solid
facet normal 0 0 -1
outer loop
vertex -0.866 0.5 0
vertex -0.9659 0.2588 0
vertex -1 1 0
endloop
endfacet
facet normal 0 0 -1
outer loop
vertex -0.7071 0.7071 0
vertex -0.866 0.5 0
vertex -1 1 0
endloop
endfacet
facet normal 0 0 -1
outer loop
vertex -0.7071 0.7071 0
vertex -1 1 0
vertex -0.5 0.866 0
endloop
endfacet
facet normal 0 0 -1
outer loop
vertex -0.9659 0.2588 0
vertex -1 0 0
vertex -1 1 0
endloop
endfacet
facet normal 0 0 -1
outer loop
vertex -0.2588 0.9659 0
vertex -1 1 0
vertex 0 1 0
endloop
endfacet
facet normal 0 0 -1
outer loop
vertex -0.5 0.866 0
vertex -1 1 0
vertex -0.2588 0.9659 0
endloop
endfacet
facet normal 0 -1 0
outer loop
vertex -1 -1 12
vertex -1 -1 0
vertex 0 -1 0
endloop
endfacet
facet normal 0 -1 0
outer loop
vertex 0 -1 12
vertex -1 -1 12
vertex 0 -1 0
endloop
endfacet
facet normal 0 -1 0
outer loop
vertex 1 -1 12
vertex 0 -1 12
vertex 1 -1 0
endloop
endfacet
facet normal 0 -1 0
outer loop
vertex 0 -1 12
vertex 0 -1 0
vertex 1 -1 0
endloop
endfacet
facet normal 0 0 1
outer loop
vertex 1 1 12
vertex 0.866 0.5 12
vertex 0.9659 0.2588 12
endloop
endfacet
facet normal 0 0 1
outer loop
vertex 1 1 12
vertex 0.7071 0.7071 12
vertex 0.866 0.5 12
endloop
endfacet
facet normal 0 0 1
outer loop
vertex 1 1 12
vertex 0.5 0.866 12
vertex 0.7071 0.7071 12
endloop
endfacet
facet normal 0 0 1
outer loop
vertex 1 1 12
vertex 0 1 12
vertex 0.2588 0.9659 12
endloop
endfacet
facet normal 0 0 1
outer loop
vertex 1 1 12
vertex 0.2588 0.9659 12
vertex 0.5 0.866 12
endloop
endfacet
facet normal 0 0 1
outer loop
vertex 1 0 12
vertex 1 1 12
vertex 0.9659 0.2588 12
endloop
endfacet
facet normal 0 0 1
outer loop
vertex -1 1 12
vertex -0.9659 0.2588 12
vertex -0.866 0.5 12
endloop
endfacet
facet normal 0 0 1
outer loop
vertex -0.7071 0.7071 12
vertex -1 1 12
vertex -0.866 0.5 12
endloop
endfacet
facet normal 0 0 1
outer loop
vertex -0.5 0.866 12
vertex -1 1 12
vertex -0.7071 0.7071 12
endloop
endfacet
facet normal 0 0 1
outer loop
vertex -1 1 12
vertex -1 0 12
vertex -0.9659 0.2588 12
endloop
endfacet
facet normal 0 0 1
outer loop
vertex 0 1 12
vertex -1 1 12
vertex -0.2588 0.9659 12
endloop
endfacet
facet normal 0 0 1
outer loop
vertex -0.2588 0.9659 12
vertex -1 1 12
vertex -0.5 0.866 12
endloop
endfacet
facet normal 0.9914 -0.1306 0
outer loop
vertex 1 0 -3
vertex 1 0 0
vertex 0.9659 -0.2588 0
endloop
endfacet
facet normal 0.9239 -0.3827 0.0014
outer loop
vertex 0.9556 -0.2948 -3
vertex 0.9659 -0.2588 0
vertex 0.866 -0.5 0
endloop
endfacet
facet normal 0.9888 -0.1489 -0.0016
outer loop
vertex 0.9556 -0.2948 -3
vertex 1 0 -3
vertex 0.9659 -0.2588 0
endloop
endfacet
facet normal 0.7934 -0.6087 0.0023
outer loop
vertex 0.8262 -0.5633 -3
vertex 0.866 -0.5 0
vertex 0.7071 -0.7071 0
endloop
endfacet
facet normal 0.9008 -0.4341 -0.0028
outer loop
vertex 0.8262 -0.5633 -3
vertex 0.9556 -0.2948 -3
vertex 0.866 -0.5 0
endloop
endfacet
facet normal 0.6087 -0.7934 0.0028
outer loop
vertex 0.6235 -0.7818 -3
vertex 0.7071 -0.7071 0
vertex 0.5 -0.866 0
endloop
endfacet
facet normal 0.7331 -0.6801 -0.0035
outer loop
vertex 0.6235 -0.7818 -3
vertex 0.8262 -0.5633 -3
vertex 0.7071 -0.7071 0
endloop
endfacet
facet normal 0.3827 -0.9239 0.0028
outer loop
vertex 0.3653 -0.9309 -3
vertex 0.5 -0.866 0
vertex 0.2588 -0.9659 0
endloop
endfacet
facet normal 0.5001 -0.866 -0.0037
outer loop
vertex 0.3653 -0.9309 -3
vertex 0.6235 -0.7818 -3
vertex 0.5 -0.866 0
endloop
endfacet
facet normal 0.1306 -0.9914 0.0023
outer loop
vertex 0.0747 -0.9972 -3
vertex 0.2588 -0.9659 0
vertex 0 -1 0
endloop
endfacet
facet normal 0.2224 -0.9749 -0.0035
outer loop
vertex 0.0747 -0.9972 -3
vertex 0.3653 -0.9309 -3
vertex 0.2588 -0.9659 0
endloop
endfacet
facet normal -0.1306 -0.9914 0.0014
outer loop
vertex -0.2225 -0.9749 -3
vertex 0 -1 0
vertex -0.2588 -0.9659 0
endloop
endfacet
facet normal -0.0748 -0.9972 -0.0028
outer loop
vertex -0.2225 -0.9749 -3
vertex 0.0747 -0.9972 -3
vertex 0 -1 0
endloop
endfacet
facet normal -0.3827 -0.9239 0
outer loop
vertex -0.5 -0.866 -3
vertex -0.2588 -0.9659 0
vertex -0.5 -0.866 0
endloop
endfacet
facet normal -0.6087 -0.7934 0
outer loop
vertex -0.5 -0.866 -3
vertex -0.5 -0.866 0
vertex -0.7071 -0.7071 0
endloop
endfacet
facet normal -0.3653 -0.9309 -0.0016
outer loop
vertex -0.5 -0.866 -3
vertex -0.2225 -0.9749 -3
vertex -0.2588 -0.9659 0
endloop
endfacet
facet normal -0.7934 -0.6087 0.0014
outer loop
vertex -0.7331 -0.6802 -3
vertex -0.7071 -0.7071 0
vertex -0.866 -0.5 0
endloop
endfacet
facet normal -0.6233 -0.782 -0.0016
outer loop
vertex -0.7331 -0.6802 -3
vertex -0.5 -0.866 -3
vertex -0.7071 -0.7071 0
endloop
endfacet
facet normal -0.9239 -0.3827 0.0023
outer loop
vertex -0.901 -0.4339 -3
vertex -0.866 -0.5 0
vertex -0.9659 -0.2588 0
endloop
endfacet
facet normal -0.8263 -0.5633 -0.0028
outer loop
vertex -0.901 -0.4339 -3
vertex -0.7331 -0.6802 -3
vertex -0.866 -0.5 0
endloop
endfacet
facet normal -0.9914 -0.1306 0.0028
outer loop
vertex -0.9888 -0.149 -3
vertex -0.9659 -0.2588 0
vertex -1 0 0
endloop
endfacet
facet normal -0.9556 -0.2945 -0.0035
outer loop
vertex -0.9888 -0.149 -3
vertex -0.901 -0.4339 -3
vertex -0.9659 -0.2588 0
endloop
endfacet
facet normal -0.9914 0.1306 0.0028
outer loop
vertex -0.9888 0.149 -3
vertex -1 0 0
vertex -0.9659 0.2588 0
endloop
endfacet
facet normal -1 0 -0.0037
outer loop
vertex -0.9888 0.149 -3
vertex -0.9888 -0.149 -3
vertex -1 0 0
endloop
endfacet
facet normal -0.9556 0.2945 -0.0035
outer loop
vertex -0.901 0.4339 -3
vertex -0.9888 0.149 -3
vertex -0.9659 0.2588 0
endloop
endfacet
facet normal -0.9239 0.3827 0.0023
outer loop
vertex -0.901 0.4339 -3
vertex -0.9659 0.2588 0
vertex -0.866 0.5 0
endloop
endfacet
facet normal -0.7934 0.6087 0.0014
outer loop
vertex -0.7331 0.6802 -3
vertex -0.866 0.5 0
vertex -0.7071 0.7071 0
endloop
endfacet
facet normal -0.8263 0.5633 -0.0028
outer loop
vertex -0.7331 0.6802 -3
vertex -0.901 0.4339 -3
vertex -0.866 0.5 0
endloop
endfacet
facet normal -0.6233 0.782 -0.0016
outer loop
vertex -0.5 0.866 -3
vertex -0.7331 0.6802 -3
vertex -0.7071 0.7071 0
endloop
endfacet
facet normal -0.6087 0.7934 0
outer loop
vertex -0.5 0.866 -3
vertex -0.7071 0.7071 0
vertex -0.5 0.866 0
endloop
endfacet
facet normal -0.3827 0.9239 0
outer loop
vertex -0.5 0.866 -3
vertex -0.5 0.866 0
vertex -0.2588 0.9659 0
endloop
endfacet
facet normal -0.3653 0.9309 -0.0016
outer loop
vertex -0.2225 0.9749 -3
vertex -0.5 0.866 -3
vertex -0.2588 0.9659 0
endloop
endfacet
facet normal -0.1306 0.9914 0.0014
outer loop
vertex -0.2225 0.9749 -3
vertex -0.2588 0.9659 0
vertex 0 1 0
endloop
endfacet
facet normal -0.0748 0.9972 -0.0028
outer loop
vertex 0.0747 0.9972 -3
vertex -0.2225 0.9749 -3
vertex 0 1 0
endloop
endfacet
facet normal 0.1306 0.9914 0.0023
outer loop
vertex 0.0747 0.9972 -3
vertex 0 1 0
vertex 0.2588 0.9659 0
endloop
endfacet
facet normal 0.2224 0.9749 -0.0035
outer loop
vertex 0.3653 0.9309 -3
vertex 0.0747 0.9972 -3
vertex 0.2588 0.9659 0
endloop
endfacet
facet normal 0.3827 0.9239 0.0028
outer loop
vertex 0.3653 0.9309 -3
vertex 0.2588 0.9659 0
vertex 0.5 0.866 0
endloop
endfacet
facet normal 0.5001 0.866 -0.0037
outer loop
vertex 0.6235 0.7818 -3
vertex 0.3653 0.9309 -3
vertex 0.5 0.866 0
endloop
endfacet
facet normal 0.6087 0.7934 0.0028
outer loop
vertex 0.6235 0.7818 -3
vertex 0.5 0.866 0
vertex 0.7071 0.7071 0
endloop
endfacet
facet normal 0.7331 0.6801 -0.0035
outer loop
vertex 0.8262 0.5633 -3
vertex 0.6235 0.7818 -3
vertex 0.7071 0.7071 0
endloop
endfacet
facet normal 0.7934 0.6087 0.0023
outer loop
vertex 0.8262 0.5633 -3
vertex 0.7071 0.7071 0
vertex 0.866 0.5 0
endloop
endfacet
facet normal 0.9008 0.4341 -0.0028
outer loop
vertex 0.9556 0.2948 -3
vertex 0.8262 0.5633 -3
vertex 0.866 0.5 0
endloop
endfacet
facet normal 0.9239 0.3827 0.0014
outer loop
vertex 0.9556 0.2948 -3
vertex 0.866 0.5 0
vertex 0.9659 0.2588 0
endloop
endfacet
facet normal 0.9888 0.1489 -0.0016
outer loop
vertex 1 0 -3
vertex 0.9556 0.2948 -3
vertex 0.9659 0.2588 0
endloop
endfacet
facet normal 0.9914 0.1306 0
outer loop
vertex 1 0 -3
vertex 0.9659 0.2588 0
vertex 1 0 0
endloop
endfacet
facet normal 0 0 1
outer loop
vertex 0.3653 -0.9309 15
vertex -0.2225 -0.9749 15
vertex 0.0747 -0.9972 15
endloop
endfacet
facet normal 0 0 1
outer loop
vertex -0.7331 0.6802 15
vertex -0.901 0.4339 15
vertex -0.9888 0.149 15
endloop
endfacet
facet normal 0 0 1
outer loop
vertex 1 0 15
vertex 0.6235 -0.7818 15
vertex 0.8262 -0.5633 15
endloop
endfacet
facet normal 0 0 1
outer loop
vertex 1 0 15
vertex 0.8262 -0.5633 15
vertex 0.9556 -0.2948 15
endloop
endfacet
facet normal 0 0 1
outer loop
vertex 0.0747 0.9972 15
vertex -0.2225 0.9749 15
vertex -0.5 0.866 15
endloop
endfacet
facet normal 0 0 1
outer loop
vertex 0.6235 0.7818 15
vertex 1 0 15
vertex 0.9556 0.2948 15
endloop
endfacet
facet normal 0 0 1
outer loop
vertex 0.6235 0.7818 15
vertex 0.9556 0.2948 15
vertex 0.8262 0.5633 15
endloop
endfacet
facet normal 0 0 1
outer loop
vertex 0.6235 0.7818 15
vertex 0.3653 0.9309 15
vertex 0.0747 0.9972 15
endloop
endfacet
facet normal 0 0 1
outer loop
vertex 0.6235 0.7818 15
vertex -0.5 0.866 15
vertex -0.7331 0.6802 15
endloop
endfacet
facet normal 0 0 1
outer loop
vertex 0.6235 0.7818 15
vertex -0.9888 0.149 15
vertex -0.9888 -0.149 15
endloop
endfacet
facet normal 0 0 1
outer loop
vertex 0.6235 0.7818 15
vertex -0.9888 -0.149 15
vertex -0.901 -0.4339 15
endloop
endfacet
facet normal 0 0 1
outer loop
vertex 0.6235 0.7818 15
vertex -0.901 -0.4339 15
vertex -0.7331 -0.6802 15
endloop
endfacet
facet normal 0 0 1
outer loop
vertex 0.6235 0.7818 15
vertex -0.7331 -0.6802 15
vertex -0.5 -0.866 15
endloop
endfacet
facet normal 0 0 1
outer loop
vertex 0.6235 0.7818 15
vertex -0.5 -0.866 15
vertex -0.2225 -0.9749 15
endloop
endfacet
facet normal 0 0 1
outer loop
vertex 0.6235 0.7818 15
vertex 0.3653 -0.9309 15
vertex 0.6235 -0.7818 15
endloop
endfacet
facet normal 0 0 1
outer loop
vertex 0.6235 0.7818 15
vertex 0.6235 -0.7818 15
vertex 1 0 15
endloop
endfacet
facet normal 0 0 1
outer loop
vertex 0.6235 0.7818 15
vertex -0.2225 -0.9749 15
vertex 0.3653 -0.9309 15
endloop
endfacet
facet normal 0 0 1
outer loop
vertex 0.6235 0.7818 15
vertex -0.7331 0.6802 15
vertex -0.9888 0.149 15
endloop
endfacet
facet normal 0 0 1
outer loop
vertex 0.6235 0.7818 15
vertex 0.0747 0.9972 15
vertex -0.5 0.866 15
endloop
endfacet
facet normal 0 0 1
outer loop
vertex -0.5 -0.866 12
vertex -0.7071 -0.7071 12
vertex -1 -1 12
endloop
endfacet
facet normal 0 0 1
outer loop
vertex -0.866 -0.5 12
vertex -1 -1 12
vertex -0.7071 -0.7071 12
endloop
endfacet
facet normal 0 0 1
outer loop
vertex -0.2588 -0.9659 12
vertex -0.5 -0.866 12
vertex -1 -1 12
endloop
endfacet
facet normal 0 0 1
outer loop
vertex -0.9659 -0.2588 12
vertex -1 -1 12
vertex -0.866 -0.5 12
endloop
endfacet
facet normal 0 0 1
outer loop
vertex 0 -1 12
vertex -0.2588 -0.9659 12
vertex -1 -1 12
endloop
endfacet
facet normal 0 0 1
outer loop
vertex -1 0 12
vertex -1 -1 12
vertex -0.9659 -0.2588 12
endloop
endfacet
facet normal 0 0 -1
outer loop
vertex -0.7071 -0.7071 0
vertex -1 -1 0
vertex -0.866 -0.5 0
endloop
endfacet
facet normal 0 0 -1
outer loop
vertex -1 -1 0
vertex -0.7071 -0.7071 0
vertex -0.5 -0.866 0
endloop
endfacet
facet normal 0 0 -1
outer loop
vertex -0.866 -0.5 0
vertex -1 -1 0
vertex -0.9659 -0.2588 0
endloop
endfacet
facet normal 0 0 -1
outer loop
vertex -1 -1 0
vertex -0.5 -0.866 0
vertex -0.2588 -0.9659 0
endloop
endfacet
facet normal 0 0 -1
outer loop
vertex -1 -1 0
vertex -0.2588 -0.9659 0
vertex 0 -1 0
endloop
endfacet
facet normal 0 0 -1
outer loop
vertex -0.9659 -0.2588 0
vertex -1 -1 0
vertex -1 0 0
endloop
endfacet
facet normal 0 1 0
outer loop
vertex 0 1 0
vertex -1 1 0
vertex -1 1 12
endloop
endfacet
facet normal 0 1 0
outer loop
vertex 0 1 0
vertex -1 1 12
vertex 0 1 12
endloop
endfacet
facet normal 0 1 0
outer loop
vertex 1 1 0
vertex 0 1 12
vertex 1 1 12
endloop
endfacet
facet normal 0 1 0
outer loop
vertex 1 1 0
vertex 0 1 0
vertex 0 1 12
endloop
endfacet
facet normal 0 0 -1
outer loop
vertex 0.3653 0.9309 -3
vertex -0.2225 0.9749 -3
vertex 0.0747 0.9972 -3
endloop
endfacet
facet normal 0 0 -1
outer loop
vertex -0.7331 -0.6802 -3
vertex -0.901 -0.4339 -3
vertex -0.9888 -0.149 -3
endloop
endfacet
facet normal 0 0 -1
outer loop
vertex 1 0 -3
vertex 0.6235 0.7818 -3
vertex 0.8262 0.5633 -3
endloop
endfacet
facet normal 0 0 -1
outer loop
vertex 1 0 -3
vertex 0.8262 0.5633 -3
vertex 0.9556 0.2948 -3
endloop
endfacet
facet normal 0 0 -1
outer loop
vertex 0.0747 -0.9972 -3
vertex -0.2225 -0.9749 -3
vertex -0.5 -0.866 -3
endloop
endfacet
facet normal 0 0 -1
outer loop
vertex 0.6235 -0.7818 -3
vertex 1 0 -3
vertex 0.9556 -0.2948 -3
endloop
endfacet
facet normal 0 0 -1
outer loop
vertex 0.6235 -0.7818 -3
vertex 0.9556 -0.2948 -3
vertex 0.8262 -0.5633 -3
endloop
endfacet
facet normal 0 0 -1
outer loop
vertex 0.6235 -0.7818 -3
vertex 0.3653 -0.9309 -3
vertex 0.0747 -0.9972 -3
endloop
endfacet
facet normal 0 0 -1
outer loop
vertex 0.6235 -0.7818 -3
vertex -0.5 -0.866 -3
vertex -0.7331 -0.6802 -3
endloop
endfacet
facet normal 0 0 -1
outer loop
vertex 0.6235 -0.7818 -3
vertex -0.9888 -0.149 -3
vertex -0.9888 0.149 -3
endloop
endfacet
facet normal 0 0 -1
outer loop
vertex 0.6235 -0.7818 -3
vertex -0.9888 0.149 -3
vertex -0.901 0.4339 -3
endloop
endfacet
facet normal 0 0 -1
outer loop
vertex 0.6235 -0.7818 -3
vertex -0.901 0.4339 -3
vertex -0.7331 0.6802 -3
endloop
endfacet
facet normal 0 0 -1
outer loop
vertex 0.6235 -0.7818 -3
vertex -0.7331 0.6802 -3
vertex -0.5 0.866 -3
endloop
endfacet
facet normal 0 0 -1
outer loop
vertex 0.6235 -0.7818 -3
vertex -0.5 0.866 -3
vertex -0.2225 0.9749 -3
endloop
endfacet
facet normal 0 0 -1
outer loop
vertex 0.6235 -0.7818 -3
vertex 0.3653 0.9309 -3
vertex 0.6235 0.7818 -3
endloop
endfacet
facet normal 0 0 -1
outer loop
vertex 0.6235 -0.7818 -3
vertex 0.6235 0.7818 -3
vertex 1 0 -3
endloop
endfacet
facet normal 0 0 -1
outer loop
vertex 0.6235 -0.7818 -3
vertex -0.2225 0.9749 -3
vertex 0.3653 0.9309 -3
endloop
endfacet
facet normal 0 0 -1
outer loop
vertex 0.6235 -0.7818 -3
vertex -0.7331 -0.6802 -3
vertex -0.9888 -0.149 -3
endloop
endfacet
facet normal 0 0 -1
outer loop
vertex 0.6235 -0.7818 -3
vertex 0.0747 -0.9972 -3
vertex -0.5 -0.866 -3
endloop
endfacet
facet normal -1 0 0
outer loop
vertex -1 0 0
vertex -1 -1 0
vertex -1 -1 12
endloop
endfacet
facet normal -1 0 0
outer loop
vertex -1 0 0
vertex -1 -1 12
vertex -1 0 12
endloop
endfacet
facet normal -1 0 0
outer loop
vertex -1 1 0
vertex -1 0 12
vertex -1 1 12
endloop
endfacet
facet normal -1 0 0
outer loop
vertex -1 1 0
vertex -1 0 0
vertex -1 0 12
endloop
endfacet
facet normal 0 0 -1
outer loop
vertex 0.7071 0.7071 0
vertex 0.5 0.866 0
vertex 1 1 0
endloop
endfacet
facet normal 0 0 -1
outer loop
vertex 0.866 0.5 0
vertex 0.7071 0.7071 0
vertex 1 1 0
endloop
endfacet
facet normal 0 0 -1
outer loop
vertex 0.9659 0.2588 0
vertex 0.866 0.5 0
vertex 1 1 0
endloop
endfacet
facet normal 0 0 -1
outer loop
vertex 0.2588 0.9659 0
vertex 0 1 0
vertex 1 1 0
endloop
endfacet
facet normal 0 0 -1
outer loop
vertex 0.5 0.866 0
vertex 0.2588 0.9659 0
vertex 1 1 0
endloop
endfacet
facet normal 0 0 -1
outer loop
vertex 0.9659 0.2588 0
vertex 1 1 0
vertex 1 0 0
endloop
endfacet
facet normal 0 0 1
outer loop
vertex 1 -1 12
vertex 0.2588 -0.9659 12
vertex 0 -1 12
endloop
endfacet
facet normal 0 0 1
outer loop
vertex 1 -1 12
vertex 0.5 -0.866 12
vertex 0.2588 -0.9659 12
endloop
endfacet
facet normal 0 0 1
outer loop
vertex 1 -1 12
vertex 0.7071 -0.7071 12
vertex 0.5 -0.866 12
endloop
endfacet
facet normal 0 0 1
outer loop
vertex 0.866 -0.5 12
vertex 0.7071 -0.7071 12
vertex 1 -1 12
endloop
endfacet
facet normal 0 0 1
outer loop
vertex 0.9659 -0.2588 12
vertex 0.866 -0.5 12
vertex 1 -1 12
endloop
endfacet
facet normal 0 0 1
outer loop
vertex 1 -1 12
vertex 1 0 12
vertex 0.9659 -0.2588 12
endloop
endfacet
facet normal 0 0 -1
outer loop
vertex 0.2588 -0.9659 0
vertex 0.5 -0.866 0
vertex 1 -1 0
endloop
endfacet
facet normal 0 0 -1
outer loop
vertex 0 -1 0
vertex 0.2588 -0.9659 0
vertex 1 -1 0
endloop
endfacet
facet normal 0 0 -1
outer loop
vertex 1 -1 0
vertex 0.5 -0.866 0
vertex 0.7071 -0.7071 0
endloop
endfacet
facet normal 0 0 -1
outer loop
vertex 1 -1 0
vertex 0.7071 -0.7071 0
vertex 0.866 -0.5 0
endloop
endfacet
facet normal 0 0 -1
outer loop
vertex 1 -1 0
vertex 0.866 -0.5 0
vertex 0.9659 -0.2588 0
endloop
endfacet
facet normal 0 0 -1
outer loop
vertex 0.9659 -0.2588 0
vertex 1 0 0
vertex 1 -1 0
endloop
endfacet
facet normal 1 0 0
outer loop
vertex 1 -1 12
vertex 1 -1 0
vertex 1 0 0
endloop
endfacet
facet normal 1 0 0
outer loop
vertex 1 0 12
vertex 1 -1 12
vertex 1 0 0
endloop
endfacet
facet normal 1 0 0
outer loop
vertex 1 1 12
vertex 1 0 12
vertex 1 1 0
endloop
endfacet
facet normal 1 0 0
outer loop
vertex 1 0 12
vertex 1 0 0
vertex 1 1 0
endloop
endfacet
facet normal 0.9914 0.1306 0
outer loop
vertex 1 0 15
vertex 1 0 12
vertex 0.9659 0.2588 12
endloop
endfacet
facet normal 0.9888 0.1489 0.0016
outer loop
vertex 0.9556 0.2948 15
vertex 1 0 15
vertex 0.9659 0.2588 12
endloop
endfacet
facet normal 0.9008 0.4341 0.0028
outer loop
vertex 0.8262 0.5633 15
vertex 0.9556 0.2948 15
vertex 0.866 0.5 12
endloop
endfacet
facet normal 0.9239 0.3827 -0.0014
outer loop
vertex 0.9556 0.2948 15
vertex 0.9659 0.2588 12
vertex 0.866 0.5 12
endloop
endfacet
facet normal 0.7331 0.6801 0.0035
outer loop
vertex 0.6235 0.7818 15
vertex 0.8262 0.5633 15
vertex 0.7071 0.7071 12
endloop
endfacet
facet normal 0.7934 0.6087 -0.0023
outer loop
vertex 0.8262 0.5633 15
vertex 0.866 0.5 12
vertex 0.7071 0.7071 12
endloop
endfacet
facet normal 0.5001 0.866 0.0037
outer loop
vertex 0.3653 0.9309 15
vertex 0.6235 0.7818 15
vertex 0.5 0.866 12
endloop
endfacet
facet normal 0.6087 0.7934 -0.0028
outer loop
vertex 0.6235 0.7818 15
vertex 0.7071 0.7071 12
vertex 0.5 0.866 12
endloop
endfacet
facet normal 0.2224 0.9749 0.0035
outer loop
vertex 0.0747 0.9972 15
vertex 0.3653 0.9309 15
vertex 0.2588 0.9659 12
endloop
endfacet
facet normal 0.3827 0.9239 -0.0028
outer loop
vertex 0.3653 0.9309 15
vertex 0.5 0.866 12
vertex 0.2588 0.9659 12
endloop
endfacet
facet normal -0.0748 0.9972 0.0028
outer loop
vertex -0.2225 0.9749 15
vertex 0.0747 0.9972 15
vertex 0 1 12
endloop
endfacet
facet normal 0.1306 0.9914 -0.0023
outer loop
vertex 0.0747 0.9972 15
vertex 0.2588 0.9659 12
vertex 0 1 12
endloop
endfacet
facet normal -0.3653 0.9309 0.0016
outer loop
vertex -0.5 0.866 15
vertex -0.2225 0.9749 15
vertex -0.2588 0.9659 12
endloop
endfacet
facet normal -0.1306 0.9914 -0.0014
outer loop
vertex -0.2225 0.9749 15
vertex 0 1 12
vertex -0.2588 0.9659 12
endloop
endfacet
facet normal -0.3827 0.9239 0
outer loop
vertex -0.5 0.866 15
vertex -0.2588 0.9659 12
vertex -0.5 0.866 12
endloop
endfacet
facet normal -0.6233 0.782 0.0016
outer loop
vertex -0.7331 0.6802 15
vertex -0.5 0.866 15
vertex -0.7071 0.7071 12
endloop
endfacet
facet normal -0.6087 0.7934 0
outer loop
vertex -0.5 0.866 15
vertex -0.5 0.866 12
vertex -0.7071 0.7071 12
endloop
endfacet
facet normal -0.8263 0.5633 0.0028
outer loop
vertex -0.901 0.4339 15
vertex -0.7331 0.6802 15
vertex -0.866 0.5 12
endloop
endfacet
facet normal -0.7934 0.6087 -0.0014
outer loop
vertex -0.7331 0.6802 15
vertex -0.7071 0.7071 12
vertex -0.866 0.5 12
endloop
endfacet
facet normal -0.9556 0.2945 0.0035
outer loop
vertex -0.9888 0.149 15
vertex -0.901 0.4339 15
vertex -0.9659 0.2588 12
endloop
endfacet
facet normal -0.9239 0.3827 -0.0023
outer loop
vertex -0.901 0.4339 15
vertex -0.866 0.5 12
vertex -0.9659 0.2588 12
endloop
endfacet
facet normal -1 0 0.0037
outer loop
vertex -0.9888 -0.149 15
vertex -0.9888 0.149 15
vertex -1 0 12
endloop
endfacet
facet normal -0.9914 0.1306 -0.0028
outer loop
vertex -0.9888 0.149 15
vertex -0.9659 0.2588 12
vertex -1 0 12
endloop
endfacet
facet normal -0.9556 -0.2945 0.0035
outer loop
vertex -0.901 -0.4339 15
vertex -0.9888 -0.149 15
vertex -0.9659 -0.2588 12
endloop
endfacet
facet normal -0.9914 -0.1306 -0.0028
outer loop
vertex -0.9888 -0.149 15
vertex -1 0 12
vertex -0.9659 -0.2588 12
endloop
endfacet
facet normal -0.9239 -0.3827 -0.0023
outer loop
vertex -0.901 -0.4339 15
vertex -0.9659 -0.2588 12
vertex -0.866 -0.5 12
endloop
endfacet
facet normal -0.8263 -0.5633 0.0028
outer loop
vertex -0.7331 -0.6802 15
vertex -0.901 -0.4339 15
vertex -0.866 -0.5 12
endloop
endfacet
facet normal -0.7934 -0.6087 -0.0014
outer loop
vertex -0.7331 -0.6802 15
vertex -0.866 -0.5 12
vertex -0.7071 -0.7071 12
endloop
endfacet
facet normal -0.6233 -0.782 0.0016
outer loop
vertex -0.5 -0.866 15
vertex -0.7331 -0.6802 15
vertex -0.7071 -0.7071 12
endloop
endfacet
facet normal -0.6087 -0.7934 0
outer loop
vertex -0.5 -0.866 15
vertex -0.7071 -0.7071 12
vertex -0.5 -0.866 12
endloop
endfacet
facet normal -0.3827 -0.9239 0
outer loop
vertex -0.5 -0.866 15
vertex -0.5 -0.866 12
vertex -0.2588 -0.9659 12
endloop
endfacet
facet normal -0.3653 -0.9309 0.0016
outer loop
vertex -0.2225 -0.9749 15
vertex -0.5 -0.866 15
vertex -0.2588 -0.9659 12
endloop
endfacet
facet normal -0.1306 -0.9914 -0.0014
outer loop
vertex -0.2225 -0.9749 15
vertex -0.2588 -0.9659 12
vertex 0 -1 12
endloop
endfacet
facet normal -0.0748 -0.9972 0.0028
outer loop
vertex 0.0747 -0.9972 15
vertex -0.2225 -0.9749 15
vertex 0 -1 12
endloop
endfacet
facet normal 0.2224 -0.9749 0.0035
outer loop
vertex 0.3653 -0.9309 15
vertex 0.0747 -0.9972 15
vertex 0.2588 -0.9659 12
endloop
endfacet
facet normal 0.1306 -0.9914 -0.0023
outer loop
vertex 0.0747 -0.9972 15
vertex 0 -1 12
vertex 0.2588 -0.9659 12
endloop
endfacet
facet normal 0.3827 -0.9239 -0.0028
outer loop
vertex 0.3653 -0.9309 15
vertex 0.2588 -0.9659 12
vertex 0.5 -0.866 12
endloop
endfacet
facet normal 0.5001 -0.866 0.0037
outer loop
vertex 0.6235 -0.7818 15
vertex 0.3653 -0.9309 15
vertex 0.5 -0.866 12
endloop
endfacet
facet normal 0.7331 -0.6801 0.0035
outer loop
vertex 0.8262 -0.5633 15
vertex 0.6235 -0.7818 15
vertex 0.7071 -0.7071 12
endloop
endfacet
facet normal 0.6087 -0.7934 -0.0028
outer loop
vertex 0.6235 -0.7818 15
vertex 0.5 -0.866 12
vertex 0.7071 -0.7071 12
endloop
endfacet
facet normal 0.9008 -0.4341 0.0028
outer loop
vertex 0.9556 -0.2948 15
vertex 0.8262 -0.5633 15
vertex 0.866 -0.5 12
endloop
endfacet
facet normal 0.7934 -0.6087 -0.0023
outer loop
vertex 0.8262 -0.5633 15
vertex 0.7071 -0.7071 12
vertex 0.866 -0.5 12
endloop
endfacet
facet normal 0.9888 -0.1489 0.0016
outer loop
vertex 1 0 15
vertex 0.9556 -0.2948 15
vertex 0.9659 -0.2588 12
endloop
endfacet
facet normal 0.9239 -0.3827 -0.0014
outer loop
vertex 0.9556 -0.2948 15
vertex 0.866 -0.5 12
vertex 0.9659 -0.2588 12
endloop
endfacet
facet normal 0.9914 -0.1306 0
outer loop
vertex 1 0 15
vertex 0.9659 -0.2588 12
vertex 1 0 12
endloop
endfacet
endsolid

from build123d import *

# Parameters (mm, degrees)
SKETCH_1_W      = 2
SKETCH_1_H      = 2
EXTRUDE_1_DEPTH = 12
SKETCH_2_R      = 1
EXTRUDE_2_DEPTH = 3
EXTRUDE_START   = 3
SKETCH_3_R      = 1
EXTRUDE_3_DEPTH = 3


with BuildPart() as part:
    # Эскиз1 → Бобышка-Вытянуть1 (new body)
    with BuildSketch(Plane.XY):
        Rectangle(SKETCH_1_W, SKETCH_1_H)
    extrude(amount=EXTRUDE_1_DEPTH)

    # Эскиз2 → Бобышка-Вытянуть2 (add)
    with BuildSketch(Plane.XY.offset(12)):
        Circle(SKETCH_2_R)
    extrude(amount=EXTRUDE_2_DEPTH)

    # Эскиз3 → Бобышка-Вытянуть3 (add)
    with BuildSketch(Plane(origin=(0, 0, 0), x_dir=(-1, 0, 0), z_dir=(0, 0, -1)).offset(EXTRUDE_START)):
        with Locations(Location((0, 0, 0), (0, 0, 180))):
            Circle(SKETCH_3_R)
    extrude(amount=-EXTRUDE_3_DEPTH)


solid = part.part
